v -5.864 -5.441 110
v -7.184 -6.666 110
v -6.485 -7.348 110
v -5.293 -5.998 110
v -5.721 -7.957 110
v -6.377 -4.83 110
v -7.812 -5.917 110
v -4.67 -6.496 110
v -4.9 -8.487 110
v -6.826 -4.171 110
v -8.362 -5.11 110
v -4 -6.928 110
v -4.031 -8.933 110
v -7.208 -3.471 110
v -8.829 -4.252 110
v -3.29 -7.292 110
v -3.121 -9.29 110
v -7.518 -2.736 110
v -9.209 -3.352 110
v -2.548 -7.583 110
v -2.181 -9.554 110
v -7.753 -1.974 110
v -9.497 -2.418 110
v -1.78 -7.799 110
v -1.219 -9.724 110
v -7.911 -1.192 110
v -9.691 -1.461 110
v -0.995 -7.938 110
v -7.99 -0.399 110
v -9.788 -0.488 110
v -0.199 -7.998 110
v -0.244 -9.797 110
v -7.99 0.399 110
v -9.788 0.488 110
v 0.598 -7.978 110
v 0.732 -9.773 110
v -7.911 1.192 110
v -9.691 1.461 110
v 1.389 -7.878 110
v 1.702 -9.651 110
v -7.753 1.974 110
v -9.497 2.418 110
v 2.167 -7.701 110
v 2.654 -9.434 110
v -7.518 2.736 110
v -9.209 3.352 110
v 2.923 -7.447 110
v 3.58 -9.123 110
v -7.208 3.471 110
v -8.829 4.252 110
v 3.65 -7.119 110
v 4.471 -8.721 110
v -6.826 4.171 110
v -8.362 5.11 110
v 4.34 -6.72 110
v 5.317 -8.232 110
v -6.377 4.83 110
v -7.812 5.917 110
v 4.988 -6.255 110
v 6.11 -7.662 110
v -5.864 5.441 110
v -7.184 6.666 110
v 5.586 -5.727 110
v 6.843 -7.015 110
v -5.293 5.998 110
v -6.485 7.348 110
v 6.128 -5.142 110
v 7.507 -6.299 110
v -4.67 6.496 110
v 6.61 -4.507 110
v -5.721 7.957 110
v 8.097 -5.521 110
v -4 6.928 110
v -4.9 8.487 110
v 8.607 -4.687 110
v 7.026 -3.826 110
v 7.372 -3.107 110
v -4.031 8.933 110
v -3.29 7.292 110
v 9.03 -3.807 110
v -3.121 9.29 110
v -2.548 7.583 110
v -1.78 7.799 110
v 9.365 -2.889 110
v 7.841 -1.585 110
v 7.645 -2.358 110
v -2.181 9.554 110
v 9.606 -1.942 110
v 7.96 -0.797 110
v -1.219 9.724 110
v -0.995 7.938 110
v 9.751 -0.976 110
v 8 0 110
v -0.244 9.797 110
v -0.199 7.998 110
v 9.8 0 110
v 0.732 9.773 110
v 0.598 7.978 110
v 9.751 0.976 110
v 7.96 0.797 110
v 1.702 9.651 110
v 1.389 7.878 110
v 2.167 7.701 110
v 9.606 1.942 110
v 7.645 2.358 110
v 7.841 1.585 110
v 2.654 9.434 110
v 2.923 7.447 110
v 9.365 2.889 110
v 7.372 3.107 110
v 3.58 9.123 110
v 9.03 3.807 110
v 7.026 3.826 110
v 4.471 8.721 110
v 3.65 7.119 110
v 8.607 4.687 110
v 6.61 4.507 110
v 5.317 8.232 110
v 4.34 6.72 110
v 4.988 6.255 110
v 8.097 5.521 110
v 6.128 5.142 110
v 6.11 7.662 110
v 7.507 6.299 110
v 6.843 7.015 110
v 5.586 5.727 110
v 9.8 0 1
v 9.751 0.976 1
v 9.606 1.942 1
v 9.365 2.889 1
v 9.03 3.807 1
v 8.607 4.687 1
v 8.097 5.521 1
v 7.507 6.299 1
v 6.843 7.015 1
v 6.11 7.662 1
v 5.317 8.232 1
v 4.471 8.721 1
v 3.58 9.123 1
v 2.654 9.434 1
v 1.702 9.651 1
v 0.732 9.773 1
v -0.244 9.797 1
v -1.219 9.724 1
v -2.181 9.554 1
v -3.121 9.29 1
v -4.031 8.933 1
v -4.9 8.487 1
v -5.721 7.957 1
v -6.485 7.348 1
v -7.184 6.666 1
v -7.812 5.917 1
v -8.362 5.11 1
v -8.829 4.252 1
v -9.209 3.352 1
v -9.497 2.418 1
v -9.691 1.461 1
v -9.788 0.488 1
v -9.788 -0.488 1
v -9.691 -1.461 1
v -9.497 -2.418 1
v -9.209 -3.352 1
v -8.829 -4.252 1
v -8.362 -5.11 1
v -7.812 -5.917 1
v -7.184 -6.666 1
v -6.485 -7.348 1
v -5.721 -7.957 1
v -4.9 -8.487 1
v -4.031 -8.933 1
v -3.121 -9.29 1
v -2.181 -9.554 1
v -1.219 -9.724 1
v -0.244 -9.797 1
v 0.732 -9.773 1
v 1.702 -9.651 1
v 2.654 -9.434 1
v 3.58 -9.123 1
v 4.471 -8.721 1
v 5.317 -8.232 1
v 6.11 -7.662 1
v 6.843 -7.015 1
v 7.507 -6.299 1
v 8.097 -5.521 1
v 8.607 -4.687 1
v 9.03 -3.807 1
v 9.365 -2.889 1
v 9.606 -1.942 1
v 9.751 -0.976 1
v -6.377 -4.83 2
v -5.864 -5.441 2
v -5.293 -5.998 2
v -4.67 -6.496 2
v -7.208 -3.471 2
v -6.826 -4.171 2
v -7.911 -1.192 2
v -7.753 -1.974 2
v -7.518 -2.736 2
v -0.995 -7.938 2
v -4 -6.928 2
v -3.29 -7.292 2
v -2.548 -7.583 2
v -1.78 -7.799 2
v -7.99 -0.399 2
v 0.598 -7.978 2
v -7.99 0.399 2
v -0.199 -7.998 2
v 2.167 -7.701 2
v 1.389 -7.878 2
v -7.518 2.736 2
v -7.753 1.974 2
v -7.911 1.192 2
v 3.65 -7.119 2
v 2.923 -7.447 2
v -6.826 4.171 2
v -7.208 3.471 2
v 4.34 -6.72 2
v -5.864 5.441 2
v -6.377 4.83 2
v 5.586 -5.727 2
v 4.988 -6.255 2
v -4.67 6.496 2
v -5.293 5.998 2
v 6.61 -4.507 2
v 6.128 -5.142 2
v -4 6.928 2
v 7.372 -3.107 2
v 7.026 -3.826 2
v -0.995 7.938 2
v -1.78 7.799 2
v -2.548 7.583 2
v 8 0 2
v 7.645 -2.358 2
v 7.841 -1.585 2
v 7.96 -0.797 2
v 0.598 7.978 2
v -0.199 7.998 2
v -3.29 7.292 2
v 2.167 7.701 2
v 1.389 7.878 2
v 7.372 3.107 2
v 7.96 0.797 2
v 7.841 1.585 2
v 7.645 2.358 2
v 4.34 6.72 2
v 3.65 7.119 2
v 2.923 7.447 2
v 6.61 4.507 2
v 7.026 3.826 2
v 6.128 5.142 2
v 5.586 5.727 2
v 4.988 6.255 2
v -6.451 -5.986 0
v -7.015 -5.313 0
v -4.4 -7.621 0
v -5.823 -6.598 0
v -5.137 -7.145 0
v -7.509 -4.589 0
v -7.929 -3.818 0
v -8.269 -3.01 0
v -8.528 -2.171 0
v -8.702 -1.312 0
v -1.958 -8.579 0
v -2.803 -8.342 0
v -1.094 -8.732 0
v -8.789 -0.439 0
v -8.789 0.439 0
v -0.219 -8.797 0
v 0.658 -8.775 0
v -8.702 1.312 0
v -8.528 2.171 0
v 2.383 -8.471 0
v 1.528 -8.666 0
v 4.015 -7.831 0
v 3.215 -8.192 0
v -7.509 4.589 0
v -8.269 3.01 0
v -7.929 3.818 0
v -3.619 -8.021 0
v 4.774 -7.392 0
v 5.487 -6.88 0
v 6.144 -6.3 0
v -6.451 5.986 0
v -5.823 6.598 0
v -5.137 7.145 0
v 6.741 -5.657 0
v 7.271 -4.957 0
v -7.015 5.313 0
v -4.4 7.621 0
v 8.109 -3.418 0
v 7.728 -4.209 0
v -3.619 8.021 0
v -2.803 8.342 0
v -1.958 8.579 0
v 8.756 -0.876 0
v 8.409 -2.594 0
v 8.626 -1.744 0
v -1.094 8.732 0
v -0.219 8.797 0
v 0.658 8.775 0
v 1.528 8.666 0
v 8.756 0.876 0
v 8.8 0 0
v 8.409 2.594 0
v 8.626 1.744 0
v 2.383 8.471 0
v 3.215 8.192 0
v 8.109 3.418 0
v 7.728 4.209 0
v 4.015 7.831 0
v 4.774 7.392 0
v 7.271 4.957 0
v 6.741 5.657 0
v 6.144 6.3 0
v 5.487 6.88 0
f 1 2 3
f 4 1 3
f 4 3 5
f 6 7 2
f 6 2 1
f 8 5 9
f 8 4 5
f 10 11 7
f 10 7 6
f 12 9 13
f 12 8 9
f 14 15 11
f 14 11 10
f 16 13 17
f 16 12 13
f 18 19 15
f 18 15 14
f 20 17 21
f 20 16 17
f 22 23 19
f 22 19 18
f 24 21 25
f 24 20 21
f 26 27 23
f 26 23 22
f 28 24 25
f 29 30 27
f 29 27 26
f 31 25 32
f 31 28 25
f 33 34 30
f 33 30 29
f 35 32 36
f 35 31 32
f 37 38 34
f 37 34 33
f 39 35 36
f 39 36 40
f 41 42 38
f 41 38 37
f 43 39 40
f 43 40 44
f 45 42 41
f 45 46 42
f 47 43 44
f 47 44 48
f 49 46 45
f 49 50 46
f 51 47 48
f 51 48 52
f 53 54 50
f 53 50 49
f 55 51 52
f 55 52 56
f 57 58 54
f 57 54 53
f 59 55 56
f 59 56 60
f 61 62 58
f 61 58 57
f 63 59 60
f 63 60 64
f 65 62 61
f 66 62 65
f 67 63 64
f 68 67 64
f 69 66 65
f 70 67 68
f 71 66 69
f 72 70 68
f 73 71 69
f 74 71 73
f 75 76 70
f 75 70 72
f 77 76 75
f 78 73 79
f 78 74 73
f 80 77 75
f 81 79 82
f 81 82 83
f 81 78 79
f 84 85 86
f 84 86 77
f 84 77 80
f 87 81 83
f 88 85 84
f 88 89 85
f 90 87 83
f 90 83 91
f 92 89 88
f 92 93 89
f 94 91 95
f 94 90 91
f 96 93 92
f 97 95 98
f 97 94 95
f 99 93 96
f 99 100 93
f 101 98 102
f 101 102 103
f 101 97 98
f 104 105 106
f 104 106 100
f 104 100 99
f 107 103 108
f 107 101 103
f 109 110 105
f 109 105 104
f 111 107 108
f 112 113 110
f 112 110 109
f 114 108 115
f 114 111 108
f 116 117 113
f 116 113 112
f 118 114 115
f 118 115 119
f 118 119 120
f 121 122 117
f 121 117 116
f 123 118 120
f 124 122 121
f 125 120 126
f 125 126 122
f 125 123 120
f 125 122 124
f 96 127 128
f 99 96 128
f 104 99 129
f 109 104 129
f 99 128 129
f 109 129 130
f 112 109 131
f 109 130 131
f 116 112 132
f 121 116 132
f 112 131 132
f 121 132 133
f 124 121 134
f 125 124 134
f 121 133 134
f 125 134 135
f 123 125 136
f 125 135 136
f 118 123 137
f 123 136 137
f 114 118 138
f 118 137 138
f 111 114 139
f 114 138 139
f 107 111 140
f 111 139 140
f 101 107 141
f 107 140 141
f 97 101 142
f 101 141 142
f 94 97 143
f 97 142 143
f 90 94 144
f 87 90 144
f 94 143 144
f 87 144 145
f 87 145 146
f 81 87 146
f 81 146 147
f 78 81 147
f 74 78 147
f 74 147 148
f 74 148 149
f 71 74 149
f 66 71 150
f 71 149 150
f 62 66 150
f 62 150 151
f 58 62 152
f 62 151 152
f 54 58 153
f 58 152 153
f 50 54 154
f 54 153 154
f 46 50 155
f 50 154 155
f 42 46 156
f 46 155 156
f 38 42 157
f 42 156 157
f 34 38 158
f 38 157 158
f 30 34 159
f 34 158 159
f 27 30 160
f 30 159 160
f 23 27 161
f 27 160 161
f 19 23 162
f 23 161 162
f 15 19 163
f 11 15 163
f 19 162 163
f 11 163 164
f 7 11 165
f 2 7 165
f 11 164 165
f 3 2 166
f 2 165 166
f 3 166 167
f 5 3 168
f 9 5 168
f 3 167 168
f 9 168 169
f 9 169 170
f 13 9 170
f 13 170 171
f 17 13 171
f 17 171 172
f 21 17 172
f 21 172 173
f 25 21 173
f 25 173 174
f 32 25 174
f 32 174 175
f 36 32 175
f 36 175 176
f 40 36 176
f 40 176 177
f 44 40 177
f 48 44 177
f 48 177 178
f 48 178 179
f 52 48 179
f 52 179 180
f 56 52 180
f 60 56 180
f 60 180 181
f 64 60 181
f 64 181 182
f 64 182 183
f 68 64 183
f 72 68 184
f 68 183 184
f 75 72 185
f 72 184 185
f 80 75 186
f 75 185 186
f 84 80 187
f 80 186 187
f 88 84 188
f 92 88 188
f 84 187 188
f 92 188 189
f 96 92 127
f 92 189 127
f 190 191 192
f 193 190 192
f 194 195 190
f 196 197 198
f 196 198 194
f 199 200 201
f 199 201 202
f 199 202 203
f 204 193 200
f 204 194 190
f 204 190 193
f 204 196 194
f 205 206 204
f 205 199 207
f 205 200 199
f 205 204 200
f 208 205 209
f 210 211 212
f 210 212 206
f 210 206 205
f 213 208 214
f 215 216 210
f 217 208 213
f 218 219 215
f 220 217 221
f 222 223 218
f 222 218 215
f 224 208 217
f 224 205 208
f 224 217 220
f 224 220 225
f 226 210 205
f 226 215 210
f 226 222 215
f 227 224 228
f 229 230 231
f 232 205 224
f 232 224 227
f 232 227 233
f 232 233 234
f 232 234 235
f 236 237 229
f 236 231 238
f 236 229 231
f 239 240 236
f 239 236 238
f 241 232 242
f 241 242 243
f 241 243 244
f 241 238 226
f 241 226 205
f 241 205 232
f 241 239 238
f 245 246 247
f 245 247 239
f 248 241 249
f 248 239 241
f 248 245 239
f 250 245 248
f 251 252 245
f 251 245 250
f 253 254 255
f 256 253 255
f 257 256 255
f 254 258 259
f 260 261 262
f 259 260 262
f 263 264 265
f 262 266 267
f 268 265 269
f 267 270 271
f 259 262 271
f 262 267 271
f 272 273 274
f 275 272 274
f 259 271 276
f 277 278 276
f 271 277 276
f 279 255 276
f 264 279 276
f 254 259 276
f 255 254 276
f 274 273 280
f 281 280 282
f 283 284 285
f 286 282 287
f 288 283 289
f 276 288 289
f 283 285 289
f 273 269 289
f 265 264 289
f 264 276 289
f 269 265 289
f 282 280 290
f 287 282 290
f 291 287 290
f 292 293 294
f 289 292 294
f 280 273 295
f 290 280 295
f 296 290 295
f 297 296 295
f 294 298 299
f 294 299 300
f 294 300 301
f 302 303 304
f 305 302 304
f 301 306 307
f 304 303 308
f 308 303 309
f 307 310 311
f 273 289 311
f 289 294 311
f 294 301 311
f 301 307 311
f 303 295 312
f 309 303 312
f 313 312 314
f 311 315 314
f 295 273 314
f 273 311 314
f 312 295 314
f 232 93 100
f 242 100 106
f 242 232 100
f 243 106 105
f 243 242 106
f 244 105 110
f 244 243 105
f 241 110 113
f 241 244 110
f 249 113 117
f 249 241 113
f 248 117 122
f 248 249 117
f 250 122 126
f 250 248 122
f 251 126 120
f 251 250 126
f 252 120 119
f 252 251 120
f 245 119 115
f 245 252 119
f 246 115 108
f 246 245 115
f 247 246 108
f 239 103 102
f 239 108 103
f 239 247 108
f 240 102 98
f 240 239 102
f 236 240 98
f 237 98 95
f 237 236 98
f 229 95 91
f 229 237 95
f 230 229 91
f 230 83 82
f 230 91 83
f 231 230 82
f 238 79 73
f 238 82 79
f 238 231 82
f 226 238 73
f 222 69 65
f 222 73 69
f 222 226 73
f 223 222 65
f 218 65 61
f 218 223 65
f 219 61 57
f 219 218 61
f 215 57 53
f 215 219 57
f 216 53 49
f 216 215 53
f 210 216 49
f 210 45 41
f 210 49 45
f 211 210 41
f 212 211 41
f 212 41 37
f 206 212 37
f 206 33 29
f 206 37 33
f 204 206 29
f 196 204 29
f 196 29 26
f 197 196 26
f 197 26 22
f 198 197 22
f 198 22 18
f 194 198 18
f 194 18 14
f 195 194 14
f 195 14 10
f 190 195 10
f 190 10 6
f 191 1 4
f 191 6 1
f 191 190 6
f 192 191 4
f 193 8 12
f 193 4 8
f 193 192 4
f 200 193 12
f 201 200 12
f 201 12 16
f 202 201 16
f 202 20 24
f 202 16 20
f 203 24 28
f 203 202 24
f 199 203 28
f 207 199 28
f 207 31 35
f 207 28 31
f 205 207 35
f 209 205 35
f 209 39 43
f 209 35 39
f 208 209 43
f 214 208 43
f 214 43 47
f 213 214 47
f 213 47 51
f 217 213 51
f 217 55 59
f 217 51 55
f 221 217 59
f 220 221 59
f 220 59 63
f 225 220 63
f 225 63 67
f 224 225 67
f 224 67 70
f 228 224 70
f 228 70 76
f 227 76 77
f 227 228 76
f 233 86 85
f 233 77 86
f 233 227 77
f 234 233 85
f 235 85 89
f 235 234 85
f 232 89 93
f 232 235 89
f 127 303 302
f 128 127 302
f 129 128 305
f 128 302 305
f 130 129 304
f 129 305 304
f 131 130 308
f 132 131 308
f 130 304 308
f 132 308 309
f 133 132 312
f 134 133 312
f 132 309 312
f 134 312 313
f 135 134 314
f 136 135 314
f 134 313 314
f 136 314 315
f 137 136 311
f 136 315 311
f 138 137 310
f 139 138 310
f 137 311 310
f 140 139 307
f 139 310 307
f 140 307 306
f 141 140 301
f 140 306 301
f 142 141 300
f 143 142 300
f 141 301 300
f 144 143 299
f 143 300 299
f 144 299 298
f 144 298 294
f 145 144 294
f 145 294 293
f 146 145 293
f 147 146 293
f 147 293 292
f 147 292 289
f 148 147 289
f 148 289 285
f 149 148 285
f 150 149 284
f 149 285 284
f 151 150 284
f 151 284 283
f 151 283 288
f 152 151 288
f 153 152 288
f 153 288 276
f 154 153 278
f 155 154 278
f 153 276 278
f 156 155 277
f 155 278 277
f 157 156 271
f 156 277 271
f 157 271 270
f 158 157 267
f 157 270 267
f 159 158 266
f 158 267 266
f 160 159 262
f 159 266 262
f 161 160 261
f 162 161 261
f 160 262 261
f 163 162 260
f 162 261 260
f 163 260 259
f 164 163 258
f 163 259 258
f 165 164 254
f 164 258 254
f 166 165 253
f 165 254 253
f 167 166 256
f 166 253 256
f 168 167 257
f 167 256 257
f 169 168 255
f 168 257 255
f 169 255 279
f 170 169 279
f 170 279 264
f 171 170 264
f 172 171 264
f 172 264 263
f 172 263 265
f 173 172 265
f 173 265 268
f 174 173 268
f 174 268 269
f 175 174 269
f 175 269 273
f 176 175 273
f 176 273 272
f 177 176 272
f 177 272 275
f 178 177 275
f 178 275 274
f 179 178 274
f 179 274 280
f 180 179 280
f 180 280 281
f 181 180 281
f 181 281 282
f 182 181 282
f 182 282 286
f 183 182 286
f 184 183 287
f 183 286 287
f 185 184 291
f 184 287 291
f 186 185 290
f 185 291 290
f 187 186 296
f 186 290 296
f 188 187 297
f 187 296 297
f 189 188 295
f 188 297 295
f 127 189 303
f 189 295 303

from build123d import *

# Parameters (mm, degrees)
CYLINDER013_R     = 8
CYLINDER013_DEPTH = 110
CYLINDER015_R     = 9.8
CYLINDER015_DEPTH = 110
CHAMFER_SIZE      = 1


with BuildPart() as negative:
    # Cylinder013 → Cylinder013 (new body)
    with BuildSketch(Plane.XY.offset(2)):
        Circle(CYLINDER013_R)
    extrude(amount=CYLINDER013_DEPTH)


with BuildPart() as central_tube:
    # Cylinder015 → Cylinder015 (new body)
    with BuildSketch(Plane.XY):
        Circle(CYLINDER015_R)
    extrude(amount=CYLINDER015_DEPTH)

    # Cut: cut negative
    add(negative.part, mode=Mode.SUBTRACT)

    # Chamfer
    chamfer_edges = [central_tube.edges().sort_by_distance(p)[0] for p in [
        (-9.8, 0, 0),
    ]]
    chamfer(chamfer_edges, length=CHAMFER_SIZE)


solid = central_tube.part
